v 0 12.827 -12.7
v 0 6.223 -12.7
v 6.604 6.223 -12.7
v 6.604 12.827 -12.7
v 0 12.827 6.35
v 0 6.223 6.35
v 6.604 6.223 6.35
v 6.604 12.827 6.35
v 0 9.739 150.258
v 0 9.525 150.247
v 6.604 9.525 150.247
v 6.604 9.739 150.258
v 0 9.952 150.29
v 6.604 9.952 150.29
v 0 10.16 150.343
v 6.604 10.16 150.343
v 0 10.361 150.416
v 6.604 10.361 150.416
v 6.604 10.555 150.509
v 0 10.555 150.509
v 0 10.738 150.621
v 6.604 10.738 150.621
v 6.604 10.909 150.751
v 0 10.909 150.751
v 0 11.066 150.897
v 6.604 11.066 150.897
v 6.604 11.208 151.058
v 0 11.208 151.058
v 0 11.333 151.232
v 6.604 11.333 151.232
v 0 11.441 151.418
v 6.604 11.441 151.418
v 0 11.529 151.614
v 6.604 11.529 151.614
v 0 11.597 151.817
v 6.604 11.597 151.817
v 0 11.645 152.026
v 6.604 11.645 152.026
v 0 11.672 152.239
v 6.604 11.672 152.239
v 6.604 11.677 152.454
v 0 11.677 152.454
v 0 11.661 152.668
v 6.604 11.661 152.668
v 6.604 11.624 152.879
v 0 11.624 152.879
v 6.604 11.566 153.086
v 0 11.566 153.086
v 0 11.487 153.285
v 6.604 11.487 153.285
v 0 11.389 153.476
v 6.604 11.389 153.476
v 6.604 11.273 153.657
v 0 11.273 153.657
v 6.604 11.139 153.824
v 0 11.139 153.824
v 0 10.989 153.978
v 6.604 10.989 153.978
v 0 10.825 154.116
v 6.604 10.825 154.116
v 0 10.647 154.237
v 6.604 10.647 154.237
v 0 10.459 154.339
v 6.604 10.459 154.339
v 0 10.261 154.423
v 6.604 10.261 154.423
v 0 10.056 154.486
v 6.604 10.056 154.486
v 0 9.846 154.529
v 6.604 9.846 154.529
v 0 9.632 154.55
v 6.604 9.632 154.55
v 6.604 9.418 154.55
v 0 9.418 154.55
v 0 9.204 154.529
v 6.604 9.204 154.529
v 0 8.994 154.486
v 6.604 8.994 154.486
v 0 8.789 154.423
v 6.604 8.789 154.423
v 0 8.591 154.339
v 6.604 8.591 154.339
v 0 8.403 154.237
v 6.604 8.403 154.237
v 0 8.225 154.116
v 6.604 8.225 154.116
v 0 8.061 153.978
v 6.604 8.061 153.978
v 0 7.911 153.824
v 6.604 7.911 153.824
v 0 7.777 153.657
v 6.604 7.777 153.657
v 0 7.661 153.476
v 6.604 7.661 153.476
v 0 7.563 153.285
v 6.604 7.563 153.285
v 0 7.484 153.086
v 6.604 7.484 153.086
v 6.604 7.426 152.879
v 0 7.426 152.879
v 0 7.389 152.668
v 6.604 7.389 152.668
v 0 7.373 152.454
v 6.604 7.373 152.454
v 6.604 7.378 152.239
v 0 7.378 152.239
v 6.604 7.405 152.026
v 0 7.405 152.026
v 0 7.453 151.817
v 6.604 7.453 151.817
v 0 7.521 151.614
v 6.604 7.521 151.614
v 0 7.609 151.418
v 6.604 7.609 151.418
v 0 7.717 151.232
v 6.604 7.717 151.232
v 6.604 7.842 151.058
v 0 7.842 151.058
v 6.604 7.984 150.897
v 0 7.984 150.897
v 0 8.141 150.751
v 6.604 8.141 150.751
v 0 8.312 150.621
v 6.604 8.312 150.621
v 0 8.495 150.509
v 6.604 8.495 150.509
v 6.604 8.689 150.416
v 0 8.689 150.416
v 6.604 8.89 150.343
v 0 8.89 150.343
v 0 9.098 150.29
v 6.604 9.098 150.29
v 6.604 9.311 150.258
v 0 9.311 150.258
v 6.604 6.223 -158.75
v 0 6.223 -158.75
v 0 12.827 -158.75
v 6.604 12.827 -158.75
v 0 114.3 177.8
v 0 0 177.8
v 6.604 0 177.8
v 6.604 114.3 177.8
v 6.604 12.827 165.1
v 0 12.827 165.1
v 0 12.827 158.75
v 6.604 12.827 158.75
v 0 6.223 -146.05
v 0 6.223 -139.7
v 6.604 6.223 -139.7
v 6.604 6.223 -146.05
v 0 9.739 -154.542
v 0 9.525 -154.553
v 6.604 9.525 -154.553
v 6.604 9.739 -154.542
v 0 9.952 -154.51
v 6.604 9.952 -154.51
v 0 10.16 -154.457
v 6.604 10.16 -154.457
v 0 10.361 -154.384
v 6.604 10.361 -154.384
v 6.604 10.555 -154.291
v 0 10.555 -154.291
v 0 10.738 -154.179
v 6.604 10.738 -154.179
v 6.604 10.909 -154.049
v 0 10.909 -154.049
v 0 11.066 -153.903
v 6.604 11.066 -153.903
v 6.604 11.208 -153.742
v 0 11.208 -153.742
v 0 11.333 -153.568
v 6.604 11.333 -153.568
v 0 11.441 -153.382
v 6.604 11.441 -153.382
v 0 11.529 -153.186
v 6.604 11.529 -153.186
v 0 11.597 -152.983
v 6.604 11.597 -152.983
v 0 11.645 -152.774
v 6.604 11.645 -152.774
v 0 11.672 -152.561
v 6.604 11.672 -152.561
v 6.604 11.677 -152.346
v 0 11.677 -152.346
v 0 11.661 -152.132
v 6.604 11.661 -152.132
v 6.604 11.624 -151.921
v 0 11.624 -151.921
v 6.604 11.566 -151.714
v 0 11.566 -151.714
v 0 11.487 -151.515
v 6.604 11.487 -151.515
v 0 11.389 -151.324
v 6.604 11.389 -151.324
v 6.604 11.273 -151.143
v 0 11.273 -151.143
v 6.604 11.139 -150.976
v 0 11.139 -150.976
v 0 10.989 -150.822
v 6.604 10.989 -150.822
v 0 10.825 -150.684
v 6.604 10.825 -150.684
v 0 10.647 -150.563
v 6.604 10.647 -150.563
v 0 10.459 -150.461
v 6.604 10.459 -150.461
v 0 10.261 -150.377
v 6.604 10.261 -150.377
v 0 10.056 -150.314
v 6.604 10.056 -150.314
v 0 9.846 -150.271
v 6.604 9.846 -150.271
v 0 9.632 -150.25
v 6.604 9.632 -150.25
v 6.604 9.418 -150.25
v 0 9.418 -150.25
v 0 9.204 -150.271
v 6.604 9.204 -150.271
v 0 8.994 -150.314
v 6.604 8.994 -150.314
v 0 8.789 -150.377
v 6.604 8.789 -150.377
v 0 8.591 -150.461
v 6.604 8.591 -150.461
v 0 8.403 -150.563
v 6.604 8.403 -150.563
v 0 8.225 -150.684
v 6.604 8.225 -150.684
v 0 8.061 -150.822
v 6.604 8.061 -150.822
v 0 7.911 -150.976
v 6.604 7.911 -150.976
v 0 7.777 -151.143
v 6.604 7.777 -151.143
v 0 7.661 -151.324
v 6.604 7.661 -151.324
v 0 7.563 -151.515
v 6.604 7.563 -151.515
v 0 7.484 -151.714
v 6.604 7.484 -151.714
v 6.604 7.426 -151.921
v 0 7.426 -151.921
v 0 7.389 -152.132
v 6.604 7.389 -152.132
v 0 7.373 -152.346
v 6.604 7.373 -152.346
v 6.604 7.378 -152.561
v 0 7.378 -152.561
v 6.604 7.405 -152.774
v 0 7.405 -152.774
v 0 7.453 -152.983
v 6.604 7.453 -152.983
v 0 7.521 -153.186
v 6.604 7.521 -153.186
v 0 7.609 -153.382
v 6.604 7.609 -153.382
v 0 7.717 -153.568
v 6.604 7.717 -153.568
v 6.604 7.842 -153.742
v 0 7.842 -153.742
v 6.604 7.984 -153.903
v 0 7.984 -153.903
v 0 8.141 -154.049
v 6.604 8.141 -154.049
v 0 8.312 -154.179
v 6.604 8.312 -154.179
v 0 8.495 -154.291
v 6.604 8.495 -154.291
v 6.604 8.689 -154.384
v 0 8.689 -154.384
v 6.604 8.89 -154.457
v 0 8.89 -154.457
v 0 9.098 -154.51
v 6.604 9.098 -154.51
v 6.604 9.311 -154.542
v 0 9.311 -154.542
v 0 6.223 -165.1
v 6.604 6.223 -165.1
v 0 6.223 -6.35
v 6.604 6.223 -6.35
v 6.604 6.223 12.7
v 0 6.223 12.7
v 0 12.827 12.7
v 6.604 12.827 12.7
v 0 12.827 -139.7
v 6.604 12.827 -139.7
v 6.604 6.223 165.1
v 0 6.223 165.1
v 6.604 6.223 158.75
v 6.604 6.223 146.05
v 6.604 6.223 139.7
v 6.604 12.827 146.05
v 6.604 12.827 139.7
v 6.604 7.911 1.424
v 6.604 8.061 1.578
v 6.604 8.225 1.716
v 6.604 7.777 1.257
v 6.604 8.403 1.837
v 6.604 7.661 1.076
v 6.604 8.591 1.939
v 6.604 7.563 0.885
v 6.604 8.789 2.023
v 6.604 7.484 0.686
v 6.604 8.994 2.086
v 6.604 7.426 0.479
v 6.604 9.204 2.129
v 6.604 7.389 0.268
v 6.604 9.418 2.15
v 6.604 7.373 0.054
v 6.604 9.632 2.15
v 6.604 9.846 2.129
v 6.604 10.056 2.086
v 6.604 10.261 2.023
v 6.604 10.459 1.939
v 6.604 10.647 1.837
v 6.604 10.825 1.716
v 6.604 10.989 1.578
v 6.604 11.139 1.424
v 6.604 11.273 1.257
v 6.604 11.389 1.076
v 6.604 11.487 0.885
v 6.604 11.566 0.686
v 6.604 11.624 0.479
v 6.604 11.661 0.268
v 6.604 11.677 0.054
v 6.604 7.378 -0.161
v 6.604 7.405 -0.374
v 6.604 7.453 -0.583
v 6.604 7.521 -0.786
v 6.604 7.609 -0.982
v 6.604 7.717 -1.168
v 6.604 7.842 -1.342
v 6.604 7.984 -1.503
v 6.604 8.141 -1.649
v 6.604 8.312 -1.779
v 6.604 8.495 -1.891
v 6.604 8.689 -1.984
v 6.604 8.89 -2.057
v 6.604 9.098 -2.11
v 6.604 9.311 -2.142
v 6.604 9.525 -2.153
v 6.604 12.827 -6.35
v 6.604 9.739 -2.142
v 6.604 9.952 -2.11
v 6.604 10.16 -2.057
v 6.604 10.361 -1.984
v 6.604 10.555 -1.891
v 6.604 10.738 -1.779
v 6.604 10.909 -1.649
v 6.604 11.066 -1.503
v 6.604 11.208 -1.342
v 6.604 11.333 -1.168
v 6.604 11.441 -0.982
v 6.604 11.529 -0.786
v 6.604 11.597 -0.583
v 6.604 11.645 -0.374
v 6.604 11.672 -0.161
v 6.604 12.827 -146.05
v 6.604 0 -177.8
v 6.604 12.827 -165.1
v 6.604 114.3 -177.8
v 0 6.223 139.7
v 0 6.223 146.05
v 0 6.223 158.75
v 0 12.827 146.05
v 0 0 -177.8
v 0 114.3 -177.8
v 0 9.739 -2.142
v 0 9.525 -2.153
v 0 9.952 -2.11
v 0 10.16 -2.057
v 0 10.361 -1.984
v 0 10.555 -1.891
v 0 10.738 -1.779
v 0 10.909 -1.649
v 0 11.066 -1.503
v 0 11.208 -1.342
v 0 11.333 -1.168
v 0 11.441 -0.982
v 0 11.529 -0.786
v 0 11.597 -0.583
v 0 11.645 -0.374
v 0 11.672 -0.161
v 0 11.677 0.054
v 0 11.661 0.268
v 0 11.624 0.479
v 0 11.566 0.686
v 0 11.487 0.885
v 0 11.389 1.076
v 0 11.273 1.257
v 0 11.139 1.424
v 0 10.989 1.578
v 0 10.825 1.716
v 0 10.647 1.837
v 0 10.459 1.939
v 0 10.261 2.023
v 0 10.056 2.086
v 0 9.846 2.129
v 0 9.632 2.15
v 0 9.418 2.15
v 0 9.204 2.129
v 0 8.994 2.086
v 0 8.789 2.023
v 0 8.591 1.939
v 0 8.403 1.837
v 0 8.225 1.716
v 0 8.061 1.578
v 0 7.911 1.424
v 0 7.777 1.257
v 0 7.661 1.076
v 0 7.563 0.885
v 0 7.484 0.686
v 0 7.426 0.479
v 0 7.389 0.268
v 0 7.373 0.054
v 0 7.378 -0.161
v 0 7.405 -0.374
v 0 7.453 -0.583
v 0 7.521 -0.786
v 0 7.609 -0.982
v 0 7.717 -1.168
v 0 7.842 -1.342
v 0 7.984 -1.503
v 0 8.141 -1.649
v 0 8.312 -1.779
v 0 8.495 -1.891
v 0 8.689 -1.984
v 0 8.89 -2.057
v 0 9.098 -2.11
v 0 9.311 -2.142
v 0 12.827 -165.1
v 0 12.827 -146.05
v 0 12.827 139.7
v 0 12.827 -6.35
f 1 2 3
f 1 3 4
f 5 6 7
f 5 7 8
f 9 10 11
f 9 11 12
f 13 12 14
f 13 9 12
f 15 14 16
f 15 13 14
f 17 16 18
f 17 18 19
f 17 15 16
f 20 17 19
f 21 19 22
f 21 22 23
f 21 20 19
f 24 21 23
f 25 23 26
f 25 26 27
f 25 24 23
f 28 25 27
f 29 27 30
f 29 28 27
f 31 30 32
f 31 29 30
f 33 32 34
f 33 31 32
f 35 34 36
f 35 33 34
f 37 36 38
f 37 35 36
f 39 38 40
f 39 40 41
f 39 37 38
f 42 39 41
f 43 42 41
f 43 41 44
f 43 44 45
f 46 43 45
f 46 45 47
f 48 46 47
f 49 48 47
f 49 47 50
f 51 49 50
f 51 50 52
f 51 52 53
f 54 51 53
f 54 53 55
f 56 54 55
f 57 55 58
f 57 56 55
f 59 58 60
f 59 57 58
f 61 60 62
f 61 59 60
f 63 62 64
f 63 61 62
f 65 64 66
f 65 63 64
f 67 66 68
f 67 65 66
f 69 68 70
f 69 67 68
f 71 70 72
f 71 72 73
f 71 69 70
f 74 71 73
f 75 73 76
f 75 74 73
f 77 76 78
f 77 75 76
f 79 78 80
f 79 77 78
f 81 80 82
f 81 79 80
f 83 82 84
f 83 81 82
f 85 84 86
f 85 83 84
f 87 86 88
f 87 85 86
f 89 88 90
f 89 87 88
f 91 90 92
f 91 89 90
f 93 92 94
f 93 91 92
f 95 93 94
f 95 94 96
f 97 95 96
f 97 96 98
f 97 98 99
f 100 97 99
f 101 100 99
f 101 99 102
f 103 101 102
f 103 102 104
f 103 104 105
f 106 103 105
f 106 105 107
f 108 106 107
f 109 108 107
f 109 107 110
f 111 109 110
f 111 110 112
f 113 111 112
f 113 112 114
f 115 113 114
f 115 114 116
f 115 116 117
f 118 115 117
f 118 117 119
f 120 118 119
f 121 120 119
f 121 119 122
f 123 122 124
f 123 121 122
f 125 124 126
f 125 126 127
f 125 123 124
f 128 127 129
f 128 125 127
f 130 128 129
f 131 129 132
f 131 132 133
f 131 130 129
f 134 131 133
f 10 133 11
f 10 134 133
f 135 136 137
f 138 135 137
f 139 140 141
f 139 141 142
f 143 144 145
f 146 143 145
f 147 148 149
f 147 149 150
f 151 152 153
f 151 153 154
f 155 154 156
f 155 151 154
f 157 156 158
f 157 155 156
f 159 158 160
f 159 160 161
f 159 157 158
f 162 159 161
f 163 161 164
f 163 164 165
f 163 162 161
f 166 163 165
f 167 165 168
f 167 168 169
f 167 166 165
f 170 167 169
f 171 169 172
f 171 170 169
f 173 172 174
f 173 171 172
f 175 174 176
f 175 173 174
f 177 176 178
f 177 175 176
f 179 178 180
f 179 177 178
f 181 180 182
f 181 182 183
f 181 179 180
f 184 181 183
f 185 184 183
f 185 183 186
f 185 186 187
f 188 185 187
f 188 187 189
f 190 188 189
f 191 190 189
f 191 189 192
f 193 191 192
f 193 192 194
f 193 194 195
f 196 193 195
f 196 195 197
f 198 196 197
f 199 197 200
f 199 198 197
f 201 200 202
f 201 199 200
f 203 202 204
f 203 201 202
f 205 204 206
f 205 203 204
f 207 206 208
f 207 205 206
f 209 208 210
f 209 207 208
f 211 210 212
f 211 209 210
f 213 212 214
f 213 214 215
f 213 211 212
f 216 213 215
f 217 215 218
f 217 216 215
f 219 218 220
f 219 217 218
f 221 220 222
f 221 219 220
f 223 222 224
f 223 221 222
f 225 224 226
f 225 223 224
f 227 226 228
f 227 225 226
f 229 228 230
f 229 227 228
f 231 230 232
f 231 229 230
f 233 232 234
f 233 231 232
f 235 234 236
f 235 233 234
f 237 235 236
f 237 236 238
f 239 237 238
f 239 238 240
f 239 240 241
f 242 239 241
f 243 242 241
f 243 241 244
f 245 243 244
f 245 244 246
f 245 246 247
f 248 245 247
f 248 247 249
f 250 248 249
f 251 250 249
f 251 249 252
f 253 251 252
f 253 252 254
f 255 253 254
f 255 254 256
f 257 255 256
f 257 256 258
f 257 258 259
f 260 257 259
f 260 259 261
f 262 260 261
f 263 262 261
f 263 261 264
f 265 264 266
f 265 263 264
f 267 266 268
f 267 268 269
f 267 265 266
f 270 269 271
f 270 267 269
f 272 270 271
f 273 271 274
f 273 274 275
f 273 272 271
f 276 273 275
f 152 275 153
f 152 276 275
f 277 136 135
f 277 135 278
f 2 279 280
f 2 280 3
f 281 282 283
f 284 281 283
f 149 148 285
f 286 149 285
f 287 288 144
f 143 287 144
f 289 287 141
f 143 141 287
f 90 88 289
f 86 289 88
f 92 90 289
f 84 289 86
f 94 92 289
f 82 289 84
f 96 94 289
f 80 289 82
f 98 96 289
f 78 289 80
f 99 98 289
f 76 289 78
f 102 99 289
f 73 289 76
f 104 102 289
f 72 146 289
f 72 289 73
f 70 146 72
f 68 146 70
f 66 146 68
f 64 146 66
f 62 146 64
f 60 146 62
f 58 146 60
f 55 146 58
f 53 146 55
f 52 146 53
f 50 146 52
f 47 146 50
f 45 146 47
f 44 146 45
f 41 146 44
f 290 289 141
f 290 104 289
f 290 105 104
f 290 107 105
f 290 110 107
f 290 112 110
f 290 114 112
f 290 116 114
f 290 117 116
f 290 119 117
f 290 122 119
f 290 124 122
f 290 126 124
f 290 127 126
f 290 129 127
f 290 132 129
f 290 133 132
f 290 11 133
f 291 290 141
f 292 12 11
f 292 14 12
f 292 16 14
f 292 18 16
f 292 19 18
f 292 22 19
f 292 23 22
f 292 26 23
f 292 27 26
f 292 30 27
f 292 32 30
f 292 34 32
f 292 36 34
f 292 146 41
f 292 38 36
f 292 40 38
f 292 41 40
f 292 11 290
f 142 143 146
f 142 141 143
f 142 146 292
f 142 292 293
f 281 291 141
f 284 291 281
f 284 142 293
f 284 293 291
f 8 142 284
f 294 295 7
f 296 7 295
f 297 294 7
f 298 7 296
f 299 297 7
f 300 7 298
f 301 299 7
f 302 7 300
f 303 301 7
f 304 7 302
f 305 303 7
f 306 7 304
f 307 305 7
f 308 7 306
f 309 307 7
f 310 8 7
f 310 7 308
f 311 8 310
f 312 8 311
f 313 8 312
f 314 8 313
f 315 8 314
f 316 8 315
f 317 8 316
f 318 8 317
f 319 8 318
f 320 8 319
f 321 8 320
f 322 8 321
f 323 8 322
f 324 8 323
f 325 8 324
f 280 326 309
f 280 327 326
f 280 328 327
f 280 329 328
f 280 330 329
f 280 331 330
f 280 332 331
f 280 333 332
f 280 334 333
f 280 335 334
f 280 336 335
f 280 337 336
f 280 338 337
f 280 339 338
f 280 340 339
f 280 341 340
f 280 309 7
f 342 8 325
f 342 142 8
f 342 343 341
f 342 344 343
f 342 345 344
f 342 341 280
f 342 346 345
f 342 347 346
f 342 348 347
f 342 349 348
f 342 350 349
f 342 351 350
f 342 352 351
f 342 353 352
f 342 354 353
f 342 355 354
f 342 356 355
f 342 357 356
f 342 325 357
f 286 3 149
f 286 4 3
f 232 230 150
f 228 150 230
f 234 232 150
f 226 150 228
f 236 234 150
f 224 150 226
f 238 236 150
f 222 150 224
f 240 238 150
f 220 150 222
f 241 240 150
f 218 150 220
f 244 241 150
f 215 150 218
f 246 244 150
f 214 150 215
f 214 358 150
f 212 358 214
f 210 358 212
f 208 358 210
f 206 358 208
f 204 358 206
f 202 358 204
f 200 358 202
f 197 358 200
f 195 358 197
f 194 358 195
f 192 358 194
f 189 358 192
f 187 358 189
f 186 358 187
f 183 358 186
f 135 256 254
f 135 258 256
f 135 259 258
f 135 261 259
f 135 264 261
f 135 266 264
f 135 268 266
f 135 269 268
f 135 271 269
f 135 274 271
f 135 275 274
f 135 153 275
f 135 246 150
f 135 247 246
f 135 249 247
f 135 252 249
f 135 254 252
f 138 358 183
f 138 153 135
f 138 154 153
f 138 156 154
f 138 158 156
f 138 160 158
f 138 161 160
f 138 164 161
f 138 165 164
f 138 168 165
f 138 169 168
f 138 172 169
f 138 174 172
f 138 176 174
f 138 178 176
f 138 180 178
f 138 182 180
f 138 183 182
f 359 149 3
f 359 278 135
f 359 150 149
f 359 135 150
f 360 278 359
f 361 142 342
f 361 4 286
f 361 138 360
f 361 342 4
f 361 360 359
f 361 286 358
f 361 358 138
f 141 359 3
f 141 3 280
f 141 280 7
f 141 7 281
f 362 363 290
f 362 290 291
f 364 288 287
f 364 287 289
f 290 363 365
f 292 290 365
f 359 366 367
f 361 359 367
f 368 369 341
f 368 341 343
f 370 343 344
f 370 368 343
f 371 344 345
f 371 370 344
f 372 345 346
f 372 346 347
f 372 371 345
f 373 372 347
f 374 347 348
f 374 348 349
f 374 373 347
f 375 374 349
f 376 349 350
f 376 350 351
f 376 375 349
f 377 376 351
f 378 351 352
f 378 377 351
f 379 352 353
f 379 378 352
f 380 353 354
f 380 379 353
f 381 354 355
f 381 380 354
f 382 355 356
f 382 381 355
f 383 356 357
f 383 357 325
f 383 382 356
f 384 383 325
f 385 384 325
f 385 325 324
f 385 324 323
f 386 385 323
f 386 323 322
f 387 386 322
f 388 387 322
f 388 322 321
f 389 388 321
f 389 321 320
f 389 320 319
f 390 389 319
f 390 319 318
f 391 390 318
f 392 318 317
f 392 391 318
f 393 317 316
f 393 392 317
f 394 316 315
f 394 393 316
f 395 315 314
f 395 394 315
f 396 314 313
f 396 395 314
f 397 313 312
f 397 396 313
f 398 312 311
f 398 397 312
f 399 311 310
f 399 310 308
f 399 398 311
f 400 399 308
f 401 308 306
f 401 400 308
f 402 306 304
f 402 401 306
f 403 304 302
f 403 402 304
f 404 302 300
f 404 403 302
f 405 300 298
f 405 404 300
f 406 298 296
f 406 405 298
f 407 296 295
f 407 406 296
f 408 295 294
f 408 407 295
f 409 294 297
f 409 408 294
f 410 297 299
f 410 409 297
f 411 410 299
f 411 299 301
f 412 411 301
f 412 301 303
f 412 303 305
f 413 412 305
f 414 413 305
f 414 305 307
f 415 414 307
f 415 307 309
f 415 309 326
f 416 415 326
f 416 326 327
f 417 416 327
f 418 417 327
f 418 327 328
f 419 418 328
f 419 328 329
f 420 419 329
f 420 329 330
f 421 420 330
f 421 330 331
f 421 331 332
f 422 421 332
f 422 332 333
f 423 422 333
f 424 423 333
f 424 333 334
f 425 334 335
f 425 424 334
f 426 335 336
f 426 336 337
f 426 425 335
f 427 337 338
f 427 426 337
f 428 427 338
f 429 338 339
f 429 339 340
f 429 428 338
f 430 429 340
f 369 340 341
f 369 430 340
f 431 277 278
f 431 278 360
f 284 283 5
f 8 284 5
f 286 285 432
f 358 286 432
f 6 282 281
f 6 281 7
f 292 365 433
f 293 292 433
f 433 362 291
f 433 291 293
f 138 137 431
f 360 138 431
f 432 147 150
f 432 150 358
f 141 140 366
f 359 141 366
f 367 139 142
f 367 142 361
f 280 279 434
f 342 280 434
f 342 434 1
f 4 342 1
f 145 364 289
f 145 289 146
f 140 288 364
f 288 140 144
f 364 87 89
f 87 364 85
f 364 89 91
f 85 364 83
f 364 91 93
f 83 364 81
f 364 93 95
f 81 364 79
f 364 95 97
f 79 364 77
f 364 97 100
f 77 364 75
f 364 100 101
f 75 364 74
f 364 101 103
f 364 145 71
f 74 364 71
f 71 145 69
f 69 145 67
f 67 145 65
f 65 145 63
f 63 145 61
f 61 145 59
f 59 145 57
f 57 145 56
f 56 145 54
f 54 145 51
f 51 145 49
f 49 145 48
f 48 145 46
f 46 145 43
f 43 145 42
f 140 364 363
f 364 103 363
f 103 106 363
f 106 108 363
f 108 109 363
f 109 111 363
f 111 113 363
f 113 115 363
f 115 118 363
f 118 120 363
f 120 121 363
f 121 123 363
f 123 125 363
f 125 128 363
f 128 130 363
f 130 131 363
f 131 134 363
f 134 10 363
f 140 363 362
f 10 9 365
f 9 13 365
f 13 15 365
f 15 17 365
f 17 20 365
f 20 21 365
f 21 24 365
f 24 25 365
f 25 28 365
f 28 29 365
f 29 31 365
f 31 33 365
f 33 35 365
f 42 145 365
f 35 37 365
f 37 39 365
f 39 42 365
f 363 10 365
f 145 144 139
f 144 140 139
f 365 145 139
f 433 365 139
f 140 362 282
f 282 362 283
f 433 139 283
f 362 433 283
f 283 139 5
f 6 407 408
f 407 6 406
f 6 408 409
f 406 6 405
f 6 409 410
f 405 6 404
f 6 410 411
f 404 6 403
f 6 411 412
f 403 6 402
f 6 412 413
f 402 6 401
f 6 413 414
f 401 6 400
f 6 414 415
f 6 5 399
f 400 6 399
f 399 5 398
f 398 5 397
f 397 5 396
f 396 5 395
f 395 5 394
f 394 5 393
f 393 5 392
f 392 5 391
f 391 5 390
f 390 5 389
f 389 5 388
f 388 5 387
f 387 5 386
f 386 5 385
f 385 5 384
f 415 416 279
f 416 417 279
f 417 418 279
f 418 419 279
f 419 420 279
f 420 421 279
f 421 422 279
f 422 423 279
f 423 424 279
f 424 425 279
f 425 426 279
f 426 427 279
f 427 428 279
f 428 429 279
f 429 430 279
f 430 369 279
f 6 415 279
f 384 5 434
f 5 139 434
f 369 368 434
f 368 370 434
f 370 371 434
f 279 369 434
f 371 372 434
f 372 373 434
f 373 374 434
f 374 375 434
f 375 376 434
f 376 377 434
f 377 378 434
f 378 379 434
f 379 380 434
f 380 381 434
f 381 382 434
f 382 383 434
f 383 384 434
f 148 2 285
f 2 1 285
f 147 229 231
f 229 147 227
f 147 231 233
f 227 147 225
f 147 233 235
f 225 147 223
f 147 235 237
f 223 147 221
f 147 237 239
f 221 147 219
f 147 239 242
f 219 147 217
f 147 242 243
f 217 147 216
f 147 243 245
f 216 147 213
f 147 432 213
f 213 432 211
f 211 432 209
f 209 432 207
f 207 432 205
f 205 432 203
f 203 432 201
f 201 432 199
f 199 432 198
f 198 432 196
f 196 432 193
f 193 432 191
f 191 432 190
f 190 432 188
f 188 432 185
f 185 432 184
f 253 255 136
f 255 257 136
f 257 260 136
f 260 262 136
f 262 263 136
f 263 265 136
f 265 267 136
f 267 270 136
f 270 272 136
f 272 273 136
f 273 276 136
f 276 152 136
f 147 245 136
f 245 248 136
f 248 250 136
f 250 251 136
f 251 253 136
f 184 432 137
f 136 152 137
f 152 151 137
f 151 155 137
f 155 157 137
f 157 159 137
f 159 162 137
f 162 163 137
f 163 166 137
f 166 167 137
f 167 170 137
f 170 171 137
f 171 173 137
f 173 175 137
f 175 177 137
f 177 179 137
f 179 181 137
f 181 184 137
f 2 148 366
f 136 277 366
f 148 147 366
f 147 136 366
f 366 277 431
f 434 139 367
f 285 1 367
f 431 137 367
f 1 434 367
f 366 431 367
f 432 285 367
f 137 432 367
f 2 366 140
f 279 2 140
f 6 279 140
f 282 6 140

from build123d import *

# Parameters (mm, degrees)
SKETCH1_W           = 355.6
SKETCH1_H           = 114.3
SKETCH1_R           = 2.15265
SKETCH1_W_2         = 6.35
SKETCH1_H_2         = 6.604
BOSS_EXTRUDE1_DEPTH = 6.604


with BuildPart() as part:
    # Sketch1 → Boss-Extrude1 (new body)
    with BuildSketch(Plane(origin=(0, 0, 0), x_dir=(0, 0, -1), z_dir=(1, 0, 0))):
        with Locations((0, 57.15)):
            Rectangle(SKETCH1_W, SKETCH1_H)
        with Locations((-152.4, 9.525)):
            Circle(SKETCH1_R, mode=Mode.SUBTRACT)
        with Locations((0, 9.525)):
            Circle(SKETCH1_R, mode=Mode.SUBTRACT)
        with Locations((152.4, 9.525)):
            Circle(SKETCH1_R, mode=Mode.SUBTRACT)
        with Locations((-142.875, 9.525)):
            Rectangle(SKETCH1_W_2, SKETCH1_H_2, mode=Mode.SUBTRACT)
        with Locations((-161.925, 9.525)):
            Rectangle(SKETCH1_W_2, SKETCH1_H_2, mode=Mode.SUBTRACT)
        with Locations((9.525, 9.525)):
            Rectangle(SKETCH1_W_2, SKETCH1_H_2, mode=Mode.SUBTRACT)
        with Locations((-9.525, 9.525)):
            Rectangle(SKETCH1_W_2, SKETCH1_H_2, mode=Mode.SUBTRACT)
        with Locations((161.925, 9.525)):
            Rectangle(SKETCH1_W_2, SKETCH1_H_2, mode=Mode.SUBTRACT)
        with Locations((142.875, 9.525)):
            Rectangle(SKETCH1_W_2, SKETCH1_H_2, mode=Mode.SUBTRACT)
    extrude(amount=BOSS_EXTRUDE1_DEPTH)


solid = part.part
